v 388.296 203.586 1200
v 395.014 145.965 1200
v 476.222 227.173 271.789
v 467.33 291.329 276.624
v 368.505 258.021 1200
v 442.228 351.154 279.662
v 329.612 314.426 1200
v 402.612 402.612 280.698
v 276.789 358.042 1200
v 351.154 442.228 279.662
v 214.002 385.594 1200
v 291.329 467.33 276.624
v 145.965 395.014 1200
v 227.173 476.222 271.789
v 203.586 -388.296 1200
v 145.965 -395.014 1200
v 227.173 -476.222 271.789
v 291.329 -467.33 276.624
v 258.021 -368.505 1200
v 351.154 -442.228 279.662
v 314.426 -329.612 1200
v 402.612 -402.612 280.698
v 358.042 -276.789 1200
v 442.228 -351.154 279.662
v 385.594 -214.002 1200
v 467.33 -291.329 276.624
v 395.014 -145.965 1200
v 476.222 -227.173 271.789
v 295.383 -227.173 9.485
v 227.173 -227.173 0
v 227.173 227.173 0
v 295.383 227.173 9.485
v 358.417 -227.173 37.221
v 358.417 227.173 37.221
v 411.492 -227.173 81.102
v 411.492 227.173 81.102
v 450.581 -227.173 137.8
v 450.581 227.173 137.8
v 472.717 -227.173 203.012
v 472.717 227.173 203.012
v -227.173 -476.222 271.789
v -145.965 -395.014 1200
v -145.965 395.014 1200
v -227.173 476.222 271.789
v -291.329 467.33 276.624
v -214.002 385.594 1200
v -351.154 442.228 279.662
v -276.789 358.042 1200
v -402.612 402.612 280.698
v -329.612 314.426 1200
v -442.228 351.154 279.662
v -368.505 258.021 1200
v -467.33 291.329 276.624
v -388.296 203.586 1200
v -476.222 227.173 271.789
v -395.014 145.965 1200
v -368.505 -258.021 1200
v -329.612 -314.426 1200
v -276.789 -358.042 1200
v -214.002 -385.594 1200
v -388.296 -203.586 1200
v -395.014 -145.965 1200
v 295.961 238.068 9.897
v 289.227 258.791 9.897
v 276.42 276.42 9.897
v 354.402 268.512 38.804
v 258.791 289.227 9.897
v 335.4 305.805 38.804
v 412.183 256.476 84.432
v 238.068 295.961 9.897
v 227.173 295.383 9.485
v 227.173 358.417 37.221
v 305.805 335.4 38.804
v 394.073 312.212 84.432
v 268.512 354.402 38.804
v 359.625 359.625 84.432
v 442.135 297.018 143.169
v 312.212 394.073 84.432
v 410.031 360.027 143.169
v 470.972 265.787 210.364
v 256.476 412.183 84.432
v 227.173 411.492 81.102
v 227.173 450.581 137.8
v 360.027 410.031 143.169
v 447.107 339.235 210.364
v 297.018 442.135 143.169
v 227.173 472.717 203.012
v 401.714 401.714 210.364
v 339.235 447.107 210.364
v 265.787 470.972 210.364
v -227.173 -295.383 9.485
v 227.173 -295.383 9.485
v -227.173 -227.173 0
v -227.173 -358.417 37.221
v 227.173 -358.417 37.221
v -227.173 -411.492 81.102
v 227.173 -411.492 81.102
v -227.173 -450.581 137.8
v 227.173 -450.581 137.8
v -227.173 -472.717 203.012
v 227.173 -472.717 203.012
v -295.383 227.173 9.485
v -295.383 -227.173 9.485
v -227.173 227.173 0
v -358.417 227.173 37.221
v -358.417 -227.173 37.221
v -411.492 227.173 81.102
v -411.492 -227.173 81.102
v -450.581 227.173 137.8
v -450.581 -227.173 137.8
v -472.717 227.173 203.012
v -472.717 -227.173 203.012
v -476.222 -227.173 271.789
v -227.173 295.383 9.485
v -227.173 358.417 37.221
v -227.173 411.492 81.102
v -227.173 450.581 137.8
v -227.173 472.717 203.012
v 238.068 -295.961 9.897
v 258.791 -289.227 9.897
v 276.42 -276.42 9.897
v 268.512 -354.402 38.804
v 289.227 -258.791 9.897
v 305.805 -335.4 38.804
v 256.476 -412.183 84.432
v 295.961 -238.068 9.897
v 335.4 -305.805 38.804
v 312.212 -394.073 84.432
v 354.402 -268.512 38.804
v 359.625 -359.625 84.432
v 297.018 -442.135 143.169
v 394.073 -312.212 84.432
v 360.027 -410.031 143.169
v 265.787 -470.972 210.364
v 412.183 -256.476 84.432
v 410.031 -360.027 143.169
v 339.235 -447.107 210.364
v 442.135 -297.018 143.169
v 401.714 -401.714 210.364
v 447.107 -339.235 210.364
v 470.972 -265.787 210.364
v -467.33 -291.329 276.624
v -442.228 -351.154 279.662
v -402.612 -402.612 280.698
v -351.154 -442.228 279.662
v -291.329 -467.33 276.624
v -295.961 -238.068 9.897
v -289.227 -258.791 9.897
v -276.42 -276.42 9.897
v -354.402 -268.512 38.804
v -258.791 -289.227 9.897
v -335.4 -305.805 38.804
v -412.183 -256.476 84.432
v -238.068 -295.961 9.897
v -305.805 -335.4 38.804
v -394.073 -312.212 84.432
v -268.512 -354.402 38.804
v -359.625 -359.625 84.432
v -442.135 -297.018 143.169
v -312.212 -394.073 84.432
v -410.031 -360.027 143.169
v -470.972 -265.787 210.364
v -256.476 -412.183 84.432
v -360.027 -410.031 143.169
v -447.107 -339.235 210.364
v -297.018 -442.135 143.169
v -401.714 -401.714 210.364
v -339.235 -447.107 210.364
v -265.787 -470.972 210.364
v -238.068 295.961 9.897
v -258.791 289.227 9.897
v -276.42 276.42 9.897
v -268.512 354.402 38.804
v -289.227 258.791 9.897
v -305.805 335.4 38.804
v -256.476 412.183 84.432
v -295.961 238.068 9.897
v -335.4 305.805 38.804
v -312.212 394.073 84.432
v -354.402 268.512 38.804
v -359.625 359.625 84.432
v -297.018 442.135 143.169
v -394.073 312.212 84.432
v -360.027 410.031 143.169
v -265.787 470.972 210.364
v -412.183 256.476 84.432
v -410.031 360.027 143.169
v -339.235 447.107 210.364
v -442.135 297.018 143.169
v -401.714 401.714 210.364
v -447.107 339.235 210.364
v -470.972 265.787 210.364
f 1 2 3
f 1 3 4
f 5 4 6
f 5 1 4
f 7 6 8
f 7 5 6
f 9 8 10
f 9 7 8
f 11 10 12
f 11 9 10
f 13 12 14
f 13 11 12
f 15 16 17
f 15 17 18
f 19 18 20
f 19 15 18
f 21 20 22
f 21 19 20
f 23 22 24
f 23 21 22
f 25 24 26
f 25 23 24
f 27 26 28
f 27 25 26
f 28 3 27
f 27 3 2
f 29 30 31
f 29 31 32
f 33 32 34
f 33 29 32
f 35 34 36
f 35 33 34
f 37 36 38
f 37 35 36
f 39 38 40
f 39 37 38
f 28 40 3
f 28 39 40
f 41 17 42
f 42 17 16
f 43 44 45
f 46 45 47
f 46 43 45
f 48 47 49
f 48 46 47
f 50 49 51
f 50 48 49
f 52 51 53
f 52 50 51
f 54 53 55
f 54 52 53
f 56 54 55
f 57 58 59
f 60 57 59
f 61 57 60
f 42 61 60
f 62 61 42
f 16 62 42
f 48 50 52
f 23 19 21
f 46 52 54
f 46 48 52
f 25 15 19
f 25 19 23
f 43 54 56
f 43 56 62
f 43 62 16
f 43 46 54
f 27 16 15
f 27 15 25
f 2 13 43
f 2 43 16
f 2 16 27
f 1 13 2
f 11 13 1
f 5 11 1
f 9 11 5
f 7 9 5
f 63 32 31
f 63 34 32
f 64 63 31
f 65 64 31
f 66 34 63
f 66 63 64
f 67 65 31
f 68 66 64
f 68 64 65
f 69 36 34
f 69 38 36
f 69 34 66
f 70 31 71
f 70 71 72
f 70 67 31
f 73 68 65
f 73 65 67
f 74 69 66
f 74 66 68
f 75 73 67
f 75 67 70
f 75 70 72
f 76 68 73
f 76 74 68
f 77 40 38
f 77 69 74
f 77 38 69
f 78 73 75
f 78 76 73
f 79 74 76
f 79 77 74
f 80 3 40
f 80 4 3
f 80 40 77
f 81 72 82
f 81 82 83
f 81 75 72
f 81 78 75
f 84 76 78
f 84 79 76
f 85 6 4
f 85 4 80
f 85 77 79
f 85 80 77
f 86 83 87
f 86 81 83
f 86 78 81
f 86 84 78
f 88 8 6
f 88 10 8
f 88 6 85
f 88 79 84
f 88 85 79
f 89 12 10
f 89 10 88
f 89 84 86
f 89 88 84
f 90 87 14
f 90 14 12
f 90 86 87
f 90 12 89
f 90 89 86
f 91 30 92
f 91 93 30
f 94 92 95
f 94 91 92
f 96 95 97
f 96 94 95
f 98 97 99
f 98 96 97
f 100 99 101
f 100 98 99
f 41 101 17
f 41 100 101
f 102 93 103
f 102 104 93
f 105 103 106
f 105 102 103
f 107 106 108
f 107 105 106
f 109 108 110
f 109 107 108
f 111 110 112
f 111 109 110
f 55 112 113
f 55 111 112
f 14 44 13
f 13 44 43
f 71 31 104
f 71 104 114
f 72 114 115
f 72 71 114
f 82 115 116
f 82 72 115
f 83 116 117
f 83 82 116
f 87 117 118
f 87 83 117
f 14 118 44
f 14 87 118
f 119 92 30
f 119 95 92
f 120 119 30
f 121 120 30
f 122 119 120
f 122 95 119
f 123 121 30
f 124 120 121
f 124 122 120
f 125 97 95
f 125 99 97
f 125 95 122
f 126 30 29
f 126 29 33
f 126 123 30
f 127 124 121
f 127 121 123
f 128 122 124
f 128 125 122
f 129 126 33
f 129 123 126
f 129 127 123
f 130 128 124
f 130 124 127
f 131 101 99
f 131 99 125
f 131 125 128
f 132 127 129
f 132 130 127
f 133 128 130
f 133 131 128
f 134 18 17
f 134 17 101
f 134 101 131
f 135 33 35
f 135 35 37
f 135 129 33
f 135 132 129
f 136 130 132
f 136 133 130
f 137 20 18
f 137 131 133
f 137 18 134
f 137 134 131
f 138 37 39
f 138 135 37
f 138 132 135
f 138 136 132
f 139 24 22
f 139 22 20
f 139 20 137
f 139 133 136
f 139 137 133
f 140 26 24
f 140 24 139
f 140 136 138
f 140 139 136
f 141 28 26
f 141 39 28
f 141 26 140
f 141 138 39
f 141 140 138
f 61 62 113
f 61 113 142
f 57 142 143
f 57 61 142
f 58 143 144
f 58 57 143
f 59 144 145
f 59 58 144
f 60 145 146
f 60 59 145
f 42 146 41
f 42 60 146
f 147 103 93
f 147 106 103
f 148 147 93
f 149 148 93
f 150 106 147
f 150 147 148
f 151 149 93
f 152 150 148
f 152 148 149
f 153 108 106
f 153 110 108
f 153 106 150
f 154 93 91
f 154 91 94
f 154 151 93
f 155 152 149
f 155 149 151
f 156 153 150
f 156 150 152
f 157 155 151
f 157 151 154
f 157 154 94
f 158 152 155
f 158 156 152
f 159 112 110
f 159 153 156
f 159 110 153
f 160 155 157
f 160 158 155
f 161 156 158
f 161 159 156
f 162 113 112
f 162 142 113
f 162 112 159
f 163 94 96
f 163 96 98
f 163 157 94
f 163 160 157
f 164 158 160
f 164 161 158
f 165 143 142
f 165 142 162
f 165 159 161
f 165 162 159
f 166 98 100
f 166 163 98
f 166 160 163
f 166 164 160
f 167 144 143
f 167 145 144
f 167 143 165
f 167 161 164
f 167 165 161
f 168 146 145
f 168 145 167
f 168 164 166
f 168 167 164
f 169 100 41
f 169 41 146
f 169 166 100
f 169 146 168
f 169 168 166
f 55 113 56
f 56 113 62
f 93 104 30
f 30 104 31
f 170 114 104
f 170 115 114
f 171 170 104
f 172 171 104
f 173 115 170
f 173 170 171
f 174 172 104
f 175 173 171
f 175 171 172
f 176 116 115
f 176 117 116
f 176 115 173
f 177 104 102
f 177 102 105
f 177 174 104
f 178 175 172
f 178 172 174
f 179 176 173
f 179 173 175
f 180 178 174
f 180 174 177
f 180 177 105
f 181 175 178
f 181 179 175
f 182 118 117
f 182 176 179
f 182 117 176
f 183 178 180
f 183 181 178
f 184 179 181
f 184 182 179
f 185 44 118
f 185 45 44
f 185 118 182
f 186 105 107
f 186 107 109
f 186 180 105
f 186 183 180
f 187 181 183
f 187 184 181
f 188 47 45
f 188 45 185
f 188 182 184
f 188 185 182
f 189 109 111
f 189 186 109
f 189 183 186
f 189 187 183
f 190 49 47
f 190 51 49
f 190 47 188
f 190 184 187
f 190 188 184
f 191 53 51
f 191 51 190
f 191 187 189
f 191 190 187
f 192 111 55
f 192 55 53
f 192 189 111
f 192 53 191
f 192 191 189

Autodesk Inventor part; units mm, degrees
ref_plane "YZ Plane" through (0, 0, 0) normal (1, 0, 0) x (0, 1, 0)
ref_plane "XZ Plane" through (0, 0, 0) normal (0, 1, 0) x (-1, 0, 0)
ref_plane "XY Plane" through (0, 0, 0) normal (0, 0, 1) x (1, 0, 0)
sketch "Sketch1" plane through (0, 0, 0) normal (0, 0, 1) x (1, 0, 0)
  line L0 (-500, 500) -> (500, 500)
  line L1 (500, 500) -> (500, -500)
  line L2 (500, -500) -> (-500, -500)
  line L3 (-500, -500) -> (-500, 500)
  line L4 (-500, 500) -> (500, -500) construction
  line L5 (500, 500) -> (-500, -500) construction
  point P0 (0, 0)
  dimension "d0" = 1000
  dimension "d1" = 1000
extrude "Extrusion1" add sketch "Sketch1" along normal blind 1200 draft -5
fillet "Fillet1" radius 250 8 edges at (447.5068, 447.5068, 600) (-447.5068, 447.5068, 600) (447.5068, -447.5068, 600) (-447.5068, -447.5068, 600) (500, 0, 0) (0, 500, 0) (-500, 0, 0) (0, -500, 0)
properties part number "NDM-VOS dummy Crane"
